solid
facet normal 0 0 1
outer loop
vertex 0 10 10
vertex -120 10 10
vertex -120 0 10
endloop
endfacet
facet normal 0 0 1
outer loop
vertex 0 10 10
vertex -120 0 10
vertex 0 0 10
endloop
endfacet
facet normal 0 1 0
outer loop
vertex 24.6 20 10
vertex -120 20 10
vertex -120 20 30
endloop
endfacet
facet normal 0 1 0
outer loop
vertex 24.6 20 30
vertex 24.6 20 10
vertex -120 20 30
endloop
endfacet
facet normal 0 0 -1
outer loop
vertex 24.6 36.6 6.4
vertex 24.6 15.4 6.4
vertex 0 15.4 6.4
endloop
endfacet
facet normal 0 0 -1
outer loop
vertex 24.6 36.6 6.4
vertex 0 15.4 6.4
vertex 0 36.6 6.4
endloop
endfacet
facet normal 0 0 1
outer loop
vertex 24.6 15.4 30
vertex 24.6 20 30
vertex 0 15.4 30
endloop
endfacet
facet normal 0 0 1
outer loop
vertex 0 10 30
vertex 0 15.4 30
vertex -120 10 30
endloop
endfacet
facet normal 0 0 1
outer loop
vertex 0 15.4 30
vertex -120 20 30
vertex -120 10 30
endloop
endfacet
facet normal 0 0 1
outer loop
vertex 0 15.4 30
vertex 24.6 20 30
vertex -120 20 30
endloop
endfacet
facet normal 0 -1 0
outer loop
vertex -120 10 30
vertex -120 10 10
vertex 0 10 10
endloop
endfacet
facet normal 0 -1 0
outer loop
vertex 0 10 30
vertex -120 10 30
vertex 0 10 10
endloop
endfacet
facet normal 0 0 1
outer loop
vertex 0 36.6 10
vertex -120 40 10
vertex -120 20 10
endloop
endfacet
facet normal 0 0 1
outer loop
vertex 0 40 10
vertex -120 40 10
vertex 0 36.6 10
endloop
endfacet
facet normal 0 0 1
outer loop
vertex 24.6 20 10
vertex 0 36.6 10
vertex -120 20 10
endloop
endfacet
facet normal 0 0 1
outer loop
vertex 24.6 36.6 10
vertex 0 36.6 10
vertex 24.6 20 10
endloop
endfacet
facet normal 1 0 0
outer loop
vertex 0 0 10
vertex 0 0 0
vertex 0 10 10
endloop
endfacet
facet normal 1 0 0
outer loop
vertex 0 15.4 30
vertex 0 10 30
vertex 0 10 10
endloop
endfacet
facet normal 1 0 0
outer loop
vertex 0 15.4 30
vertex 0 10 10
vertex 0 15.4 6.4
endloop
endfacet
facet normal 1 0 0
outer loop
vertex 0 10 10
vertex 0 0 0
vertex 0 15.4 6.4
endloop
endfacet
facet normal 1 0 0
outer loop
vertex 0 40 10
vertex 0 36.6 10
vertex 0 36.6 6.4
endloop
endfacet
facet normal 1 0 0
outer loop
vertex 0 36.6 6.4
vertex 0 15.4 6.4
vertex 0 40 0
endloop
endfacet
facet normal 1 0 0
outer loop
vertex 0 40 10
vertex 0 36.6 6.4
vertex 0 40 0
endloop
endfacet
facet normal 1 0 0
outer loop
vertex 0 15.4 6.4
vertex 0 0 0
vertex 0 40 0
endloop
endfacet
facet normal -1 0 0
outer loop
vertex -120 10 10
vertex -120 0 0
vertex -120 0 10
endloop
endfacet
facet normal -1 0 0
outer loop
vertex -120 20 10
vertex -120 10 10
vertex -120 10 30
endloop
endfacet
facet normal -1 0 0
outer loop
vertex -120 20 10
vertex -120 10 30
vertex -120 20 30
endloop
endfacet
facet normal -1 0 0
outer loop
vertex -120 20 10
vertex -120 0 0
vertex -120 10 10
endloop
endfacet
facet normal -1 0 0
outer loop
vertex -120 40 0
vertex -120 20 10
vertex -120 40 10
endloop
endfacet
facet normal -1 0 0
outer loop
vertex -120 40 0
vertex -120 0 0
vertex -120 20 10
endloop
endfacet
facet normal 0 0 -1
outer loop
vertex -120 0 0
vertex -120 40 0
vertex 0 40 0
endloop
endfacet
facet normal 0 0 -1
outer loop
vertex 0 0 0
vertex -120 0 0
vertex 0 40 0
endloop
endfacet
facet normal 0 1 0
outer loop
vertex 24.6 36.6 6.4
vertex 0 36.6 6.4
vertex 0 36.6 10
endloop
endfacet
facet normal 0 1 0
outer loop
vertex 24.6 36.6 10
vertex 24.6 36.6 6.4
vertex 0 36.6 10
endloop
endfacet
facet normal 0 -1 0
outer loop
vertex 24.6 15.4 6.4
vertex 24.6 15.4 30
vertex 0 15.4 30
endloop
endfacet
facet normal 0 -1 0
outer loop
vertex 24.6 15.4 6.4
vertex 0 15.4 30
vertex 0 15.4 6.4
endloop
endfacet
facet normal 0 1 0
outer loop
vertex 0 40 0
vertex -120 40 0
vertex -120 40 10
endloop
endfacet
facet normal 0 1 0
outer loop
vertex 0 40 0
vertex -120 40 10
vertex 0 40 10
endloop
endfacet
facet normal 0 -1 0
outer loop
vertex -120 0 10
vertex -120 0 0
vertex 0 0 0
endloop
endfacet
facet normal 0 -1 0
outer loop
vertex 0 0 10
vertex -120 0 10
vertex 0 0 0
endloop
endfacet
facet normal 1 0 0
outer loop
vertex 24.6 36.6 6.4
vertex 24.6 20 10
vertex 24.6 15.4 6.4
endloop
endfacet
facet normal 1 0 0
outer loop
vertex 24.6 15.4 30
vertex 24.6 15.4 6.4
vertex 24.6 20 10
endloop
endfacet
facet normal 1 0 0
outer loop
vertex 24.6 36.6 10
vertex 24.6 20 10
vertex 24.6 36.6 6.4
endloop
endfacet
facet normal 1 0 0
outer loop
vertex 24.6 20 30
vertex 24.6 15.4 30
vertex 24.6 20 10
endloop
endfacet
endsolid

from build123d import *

# Parameters (mm, degrees)
SKETCH_W     = 120
SKETCH_H     = 40
PAD_DEPTH    = 10
SKETCH001_W  = 120
SKETCH001_H  = 10
PAD001_DEPTH = 20
PAD002_DEPTH = 24.6


with BuildPart() as part:
    # Sketch → Pad (new body)
    with BuildSketch(Plane.XY):
        with Locations((-60, 20)):
            Rectangle(SKETCH_W, SKETCH_H)
    extrude(amount=PAD_DEPTH)

    # Sketch001 (on Face6 of Pad) → Pad001 (join)
    with BuildSketch(Plane.XY.offset(10)):
        with Locations((-60, 15)):
            Rectangle(SKETCH001_W, SKETCH001_H)
    extrude(amount=PAD001_DEPTH)

    # Sketch002 (on Face8 of Pad001) → Pad002 (join)
    with BuildSketch(Plane.YZ):
        Polygon((15.4, 30), (15.4, 6.4), (36.6, 6.4), (36.6, 10), (20, 10), (20, 30), align=None)
    extrude(amount=PAD002_DEPTH)


solid = part.part
